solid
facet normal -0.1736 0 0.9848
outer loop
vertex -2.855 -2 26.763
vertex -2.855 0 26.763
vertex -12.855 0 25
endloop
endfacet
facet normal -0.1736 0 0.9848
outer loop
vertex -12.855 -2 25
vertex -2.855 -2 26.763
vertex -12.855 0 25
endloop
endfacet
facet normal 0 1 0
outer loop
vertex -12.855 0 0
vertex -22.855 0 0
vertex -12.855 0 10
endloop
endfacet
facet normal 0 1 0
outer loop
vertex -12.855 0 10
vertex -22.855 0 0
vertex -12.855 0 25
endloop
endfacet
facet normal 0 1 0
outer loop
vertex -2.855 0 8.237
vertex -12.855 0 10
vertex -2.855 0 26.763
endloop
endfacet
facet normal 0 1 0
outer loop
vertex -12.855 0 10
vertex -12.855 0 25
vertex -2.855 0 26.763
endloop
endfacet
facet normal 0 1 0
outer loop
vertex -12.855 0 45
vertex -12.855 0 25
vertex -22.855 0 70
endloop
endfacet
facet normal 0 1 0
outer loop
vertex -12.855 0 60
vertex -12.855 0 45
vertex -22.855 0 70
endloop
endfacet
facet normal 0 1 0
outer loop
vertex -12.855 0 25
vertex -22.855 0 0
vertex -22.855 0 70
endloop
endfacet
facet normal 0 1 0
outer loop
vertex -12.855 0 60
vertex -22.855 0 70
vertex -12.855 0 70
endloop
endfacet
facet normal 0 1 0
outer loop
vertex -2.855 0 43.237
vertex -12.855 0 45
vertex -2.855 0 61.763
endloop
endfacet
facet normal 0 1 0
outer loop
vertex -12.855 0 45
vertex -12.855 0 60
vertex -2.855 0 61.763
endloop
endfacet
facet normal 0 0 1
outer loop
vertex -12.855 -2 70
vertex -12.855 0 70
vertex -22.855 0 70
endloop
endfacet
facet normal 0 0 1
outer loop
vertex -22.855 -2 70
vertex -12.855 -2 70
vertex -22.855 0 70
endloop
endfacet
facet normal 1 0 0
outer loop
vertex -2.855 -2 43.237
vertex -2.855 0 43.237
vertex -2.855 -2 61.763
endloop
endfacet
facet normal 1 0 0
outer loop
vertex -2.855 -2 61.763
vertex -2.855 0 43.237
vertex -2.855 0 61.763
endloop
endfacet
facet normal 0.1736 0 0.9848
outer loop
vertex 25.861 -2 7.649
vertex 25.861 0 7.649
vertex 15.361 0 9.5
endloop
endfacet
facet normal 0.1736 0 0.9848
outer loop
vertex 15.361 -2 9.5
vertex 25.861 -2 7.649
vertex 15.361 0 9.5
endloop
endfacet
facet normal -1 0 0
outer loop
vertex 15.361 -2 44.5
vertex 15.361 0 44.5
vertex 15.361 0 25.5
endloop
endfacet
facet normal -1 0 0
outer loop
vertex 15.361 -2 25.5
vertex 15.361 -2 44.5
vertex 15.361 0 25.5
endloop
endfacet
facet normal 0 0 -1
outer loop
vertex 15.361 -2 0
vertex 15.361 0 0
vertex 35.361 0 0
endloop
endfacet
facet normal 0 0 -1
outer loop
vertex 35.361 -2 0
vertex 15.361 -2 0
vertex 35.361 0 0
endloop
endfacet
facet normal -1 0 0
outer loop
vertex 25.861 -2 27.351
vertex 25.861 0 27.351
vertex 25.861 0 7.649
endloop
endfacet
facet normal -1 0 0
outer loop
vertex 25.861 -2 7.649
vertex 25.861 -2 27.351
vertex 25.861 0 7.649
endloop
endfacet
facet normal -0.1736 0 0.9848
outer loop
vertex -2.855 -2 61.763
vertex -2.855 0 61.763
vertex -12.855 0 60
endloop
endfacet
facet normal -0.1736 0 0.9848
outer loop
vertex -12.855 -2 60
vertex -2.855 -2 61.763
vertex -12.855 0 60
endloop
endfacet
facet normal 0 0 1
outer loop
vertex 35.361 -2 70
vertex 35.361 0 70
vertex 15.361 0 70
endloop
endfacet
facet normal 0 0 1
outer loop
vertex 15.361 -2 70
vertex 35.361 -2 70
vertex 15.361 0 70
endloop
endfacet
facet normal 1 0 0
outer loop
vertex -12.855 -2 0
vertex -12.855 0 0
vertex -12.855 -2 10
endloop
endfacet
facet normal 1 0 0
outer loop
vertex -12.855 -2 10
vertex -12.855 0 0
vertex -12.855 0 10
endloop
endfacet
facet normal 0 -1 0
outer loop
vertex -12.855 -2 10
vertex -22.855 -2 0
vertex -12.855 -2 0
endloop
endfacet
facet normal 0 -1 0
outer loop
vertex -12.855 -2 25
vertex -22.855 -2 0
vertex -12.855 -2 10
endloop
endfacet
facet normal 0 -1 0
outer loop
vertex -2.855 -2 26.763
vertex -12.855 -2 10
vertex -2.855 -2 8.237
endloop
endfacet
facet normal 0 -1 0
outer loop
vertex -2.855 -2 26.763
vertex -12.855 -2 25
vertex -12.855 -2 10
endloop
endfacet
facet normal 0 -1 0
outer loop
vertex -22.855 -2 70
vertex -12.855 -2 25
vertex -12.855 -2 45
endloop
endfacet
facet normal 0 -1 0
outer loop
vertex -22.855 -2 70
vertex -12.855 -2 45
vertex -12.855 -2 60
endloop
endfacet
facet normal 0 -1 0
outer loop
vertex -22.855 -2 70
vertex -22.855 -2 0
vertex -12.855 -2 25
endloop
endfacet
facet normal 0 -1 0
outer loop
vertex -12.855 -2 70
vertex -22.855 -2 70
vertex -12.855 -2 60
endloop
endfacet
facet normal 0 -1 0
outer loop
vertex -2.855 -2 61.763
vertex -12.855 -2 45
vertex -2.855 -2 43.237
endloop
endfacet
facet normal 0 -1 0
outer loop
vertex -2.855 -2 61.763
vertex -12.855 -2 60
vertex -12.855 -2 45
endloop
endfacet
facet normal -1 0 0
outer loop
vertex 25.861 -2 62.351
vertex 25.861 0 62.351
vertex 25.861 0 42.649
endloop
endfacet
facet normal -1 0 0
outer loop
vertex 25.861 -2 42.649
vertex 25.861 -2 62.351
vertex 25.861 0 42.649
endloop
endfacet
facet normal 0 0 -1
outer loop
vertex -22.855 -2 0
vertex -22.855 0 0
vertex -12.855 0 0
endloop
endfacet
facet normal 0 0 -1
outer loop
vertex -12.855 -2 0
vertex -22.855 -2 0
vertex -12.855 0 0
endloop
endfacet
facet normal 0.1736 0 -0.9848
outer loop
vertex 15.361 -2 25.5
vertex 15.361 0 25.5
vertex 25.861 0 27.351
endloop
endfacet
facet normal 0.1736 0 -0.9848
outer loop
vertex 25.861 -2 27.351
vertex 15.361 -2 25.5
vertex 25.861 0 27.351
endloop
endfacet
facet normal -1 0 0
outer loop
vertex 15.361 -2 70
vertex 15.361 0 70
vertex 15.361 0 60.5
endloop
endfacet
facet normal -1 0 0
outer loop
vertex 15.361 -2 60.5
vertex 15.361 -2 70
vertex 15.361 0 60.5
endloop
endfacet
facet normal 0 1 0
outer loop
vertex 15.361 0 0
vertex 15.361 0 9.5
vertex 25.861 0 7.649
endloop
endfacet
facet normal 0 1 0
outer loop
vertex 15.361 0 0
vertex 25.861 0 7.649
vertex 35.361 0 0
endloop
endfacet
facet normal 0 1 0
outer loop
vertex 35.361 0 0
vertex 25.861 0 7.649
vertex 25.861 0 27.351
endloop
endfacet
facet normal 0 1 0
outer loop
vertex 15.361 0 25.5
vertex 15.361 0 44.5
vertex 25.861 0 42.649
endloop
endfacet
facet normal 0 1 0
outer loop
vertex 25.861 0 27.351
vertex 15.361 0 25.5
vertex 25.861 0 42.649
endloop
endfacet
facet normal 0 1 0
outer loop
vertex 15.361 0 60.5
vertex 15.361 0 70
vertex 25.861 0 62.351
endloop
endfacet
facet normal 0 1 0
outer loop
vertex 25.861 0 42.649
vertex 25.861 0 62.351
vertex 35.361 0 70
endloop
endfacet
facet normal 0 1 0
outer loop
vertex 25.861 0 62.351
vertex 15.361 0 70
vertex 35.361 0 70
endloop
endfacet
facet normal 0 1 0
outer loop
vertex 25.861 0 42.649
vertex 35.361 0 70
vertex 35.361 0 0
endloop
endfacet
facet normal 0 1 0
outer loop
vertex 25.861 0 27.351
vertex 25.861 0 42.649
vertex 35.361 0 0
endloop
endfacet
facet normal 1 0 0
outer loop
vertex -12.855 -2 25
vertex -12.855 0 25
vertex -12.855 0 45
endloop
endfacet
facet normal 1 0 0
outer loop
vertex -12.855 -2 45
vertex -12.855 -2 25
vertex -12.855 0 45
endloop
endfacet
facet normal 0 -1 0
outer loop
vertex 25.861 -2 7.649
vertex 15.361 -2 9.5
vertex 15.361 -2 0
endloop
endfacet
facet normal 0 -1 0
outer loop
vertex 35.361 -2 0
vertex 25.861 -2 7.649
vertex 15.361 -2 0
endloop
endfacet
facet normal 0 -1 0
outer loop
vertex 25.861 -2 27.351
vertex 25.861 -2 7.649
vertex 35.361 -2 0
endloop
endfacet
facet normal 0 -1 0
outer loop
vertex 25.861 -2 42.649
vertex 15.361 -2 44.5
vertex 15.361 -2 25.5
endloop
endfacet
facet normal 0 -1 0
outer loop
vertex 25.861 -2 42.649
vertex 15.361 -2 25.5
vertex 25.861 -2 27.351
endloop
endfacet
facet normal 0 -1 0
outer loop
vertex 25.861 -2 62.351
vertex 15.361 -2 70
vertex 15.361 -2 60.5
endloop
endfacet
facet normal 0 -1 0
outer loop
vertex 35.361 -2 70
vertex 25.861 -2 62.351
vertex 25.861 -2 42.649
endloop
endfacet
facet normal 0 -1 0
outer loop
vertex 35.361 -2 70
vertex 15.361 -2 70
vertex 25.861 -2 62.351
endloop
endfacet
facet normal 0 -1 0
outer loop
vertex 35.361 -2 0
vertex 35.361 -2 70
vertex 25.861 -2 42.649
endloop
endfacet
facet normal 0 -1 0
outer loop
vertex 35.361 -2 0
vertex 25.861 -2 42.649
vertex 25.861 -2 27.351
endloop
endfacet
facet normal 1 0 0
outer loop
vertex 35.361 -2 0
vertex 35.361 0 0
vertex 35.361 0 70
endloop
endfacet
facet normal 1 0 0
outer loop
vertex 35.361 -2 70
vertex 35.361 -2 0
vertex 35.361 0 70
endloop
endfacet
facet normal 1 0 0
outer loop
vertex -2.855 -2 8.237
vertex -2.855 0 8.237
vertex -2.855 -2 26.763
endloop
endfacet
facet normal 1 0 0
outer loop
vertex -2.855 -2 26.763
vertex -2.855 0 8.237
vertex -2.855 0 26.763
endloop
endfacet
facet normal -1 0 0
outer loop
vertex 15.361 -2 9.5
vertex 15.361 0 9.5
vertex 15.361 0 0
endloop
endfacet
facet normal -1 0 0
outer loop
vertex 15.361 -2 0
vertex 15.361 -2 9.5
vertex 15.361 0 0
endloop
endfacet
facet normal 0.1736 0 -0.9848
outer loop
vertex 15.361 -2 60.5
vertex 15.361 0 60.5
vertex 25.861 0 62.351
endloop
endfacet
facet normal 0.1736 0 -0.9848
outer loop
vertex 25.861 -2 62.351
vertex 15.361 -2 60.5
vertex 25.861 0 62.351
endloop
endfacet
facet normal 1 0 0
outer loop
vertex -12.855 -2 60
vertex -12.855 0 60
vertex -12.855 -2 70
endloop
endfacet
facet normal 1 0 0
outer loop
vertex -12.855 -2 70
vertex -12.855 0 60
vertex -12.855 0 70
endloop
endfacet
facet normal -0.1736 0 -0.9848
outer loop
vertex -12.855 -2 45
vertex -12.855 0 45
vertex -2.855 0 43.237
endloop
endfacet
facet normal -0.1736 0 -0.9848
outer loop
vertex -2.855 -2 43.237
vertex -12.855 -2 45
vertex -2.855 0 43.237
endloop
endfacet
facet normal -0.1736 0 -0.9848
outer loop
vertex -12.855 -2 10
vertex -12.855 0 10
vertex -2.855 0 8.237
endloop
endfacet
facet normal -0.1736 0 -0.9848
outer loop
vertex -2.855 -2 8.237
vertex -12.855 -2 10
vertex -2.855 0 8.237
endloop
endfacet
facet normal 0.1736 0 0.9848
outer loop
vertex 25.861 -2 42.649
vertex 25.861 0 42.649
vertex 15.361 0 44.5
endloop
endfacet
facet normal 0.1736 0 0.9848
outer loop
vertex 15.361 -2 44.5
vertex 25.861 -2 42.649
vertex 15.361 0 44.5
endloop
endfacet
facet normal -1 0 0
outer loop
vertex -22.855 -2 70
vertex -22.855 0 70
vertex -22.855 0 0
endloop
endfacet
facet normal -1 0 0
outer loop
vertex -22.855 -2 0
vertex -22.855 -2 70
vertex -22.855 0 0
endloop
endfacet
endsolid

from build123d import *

# Parameters (mm, degrees)
F1_DEPTH = 2


with BuildPart() as f1:
    # F0 (on Front) → F1 (new body)
    with BuildSketch(Plane.XZ):
        Polygon((-22.85489, 0), (-12.85489, 0), (-12.85489, 10), (-2.85489, 8.23673), (-2.85489, 26.76327), (-12.85489, 25), (-12.85489, 35), (-12.85489, 45), (-2.85489, 43.23673), (-2.85489, 61.76327), (-12.85489, 60), (-12.85489, 70), (-22.85489, 70), (-22.85489, 35), align=None)
        Polygon((15.360895, 9.5), (15.360895, 0), (35.360895, 0), (35.360895, 35), (35.360895, 70), (15.360895, 70), (15.360895, 60.5), (25.860895, 62.351433), (25.860895, 42.648567), (15.360895, 44.5), (15.360895, 35), (15.360895, 25.5), (25.860895, 27.351433), (25.860895, 7.648567), align=None)
    extrude(amount=F1_DEPTH)


solid = f1.part
